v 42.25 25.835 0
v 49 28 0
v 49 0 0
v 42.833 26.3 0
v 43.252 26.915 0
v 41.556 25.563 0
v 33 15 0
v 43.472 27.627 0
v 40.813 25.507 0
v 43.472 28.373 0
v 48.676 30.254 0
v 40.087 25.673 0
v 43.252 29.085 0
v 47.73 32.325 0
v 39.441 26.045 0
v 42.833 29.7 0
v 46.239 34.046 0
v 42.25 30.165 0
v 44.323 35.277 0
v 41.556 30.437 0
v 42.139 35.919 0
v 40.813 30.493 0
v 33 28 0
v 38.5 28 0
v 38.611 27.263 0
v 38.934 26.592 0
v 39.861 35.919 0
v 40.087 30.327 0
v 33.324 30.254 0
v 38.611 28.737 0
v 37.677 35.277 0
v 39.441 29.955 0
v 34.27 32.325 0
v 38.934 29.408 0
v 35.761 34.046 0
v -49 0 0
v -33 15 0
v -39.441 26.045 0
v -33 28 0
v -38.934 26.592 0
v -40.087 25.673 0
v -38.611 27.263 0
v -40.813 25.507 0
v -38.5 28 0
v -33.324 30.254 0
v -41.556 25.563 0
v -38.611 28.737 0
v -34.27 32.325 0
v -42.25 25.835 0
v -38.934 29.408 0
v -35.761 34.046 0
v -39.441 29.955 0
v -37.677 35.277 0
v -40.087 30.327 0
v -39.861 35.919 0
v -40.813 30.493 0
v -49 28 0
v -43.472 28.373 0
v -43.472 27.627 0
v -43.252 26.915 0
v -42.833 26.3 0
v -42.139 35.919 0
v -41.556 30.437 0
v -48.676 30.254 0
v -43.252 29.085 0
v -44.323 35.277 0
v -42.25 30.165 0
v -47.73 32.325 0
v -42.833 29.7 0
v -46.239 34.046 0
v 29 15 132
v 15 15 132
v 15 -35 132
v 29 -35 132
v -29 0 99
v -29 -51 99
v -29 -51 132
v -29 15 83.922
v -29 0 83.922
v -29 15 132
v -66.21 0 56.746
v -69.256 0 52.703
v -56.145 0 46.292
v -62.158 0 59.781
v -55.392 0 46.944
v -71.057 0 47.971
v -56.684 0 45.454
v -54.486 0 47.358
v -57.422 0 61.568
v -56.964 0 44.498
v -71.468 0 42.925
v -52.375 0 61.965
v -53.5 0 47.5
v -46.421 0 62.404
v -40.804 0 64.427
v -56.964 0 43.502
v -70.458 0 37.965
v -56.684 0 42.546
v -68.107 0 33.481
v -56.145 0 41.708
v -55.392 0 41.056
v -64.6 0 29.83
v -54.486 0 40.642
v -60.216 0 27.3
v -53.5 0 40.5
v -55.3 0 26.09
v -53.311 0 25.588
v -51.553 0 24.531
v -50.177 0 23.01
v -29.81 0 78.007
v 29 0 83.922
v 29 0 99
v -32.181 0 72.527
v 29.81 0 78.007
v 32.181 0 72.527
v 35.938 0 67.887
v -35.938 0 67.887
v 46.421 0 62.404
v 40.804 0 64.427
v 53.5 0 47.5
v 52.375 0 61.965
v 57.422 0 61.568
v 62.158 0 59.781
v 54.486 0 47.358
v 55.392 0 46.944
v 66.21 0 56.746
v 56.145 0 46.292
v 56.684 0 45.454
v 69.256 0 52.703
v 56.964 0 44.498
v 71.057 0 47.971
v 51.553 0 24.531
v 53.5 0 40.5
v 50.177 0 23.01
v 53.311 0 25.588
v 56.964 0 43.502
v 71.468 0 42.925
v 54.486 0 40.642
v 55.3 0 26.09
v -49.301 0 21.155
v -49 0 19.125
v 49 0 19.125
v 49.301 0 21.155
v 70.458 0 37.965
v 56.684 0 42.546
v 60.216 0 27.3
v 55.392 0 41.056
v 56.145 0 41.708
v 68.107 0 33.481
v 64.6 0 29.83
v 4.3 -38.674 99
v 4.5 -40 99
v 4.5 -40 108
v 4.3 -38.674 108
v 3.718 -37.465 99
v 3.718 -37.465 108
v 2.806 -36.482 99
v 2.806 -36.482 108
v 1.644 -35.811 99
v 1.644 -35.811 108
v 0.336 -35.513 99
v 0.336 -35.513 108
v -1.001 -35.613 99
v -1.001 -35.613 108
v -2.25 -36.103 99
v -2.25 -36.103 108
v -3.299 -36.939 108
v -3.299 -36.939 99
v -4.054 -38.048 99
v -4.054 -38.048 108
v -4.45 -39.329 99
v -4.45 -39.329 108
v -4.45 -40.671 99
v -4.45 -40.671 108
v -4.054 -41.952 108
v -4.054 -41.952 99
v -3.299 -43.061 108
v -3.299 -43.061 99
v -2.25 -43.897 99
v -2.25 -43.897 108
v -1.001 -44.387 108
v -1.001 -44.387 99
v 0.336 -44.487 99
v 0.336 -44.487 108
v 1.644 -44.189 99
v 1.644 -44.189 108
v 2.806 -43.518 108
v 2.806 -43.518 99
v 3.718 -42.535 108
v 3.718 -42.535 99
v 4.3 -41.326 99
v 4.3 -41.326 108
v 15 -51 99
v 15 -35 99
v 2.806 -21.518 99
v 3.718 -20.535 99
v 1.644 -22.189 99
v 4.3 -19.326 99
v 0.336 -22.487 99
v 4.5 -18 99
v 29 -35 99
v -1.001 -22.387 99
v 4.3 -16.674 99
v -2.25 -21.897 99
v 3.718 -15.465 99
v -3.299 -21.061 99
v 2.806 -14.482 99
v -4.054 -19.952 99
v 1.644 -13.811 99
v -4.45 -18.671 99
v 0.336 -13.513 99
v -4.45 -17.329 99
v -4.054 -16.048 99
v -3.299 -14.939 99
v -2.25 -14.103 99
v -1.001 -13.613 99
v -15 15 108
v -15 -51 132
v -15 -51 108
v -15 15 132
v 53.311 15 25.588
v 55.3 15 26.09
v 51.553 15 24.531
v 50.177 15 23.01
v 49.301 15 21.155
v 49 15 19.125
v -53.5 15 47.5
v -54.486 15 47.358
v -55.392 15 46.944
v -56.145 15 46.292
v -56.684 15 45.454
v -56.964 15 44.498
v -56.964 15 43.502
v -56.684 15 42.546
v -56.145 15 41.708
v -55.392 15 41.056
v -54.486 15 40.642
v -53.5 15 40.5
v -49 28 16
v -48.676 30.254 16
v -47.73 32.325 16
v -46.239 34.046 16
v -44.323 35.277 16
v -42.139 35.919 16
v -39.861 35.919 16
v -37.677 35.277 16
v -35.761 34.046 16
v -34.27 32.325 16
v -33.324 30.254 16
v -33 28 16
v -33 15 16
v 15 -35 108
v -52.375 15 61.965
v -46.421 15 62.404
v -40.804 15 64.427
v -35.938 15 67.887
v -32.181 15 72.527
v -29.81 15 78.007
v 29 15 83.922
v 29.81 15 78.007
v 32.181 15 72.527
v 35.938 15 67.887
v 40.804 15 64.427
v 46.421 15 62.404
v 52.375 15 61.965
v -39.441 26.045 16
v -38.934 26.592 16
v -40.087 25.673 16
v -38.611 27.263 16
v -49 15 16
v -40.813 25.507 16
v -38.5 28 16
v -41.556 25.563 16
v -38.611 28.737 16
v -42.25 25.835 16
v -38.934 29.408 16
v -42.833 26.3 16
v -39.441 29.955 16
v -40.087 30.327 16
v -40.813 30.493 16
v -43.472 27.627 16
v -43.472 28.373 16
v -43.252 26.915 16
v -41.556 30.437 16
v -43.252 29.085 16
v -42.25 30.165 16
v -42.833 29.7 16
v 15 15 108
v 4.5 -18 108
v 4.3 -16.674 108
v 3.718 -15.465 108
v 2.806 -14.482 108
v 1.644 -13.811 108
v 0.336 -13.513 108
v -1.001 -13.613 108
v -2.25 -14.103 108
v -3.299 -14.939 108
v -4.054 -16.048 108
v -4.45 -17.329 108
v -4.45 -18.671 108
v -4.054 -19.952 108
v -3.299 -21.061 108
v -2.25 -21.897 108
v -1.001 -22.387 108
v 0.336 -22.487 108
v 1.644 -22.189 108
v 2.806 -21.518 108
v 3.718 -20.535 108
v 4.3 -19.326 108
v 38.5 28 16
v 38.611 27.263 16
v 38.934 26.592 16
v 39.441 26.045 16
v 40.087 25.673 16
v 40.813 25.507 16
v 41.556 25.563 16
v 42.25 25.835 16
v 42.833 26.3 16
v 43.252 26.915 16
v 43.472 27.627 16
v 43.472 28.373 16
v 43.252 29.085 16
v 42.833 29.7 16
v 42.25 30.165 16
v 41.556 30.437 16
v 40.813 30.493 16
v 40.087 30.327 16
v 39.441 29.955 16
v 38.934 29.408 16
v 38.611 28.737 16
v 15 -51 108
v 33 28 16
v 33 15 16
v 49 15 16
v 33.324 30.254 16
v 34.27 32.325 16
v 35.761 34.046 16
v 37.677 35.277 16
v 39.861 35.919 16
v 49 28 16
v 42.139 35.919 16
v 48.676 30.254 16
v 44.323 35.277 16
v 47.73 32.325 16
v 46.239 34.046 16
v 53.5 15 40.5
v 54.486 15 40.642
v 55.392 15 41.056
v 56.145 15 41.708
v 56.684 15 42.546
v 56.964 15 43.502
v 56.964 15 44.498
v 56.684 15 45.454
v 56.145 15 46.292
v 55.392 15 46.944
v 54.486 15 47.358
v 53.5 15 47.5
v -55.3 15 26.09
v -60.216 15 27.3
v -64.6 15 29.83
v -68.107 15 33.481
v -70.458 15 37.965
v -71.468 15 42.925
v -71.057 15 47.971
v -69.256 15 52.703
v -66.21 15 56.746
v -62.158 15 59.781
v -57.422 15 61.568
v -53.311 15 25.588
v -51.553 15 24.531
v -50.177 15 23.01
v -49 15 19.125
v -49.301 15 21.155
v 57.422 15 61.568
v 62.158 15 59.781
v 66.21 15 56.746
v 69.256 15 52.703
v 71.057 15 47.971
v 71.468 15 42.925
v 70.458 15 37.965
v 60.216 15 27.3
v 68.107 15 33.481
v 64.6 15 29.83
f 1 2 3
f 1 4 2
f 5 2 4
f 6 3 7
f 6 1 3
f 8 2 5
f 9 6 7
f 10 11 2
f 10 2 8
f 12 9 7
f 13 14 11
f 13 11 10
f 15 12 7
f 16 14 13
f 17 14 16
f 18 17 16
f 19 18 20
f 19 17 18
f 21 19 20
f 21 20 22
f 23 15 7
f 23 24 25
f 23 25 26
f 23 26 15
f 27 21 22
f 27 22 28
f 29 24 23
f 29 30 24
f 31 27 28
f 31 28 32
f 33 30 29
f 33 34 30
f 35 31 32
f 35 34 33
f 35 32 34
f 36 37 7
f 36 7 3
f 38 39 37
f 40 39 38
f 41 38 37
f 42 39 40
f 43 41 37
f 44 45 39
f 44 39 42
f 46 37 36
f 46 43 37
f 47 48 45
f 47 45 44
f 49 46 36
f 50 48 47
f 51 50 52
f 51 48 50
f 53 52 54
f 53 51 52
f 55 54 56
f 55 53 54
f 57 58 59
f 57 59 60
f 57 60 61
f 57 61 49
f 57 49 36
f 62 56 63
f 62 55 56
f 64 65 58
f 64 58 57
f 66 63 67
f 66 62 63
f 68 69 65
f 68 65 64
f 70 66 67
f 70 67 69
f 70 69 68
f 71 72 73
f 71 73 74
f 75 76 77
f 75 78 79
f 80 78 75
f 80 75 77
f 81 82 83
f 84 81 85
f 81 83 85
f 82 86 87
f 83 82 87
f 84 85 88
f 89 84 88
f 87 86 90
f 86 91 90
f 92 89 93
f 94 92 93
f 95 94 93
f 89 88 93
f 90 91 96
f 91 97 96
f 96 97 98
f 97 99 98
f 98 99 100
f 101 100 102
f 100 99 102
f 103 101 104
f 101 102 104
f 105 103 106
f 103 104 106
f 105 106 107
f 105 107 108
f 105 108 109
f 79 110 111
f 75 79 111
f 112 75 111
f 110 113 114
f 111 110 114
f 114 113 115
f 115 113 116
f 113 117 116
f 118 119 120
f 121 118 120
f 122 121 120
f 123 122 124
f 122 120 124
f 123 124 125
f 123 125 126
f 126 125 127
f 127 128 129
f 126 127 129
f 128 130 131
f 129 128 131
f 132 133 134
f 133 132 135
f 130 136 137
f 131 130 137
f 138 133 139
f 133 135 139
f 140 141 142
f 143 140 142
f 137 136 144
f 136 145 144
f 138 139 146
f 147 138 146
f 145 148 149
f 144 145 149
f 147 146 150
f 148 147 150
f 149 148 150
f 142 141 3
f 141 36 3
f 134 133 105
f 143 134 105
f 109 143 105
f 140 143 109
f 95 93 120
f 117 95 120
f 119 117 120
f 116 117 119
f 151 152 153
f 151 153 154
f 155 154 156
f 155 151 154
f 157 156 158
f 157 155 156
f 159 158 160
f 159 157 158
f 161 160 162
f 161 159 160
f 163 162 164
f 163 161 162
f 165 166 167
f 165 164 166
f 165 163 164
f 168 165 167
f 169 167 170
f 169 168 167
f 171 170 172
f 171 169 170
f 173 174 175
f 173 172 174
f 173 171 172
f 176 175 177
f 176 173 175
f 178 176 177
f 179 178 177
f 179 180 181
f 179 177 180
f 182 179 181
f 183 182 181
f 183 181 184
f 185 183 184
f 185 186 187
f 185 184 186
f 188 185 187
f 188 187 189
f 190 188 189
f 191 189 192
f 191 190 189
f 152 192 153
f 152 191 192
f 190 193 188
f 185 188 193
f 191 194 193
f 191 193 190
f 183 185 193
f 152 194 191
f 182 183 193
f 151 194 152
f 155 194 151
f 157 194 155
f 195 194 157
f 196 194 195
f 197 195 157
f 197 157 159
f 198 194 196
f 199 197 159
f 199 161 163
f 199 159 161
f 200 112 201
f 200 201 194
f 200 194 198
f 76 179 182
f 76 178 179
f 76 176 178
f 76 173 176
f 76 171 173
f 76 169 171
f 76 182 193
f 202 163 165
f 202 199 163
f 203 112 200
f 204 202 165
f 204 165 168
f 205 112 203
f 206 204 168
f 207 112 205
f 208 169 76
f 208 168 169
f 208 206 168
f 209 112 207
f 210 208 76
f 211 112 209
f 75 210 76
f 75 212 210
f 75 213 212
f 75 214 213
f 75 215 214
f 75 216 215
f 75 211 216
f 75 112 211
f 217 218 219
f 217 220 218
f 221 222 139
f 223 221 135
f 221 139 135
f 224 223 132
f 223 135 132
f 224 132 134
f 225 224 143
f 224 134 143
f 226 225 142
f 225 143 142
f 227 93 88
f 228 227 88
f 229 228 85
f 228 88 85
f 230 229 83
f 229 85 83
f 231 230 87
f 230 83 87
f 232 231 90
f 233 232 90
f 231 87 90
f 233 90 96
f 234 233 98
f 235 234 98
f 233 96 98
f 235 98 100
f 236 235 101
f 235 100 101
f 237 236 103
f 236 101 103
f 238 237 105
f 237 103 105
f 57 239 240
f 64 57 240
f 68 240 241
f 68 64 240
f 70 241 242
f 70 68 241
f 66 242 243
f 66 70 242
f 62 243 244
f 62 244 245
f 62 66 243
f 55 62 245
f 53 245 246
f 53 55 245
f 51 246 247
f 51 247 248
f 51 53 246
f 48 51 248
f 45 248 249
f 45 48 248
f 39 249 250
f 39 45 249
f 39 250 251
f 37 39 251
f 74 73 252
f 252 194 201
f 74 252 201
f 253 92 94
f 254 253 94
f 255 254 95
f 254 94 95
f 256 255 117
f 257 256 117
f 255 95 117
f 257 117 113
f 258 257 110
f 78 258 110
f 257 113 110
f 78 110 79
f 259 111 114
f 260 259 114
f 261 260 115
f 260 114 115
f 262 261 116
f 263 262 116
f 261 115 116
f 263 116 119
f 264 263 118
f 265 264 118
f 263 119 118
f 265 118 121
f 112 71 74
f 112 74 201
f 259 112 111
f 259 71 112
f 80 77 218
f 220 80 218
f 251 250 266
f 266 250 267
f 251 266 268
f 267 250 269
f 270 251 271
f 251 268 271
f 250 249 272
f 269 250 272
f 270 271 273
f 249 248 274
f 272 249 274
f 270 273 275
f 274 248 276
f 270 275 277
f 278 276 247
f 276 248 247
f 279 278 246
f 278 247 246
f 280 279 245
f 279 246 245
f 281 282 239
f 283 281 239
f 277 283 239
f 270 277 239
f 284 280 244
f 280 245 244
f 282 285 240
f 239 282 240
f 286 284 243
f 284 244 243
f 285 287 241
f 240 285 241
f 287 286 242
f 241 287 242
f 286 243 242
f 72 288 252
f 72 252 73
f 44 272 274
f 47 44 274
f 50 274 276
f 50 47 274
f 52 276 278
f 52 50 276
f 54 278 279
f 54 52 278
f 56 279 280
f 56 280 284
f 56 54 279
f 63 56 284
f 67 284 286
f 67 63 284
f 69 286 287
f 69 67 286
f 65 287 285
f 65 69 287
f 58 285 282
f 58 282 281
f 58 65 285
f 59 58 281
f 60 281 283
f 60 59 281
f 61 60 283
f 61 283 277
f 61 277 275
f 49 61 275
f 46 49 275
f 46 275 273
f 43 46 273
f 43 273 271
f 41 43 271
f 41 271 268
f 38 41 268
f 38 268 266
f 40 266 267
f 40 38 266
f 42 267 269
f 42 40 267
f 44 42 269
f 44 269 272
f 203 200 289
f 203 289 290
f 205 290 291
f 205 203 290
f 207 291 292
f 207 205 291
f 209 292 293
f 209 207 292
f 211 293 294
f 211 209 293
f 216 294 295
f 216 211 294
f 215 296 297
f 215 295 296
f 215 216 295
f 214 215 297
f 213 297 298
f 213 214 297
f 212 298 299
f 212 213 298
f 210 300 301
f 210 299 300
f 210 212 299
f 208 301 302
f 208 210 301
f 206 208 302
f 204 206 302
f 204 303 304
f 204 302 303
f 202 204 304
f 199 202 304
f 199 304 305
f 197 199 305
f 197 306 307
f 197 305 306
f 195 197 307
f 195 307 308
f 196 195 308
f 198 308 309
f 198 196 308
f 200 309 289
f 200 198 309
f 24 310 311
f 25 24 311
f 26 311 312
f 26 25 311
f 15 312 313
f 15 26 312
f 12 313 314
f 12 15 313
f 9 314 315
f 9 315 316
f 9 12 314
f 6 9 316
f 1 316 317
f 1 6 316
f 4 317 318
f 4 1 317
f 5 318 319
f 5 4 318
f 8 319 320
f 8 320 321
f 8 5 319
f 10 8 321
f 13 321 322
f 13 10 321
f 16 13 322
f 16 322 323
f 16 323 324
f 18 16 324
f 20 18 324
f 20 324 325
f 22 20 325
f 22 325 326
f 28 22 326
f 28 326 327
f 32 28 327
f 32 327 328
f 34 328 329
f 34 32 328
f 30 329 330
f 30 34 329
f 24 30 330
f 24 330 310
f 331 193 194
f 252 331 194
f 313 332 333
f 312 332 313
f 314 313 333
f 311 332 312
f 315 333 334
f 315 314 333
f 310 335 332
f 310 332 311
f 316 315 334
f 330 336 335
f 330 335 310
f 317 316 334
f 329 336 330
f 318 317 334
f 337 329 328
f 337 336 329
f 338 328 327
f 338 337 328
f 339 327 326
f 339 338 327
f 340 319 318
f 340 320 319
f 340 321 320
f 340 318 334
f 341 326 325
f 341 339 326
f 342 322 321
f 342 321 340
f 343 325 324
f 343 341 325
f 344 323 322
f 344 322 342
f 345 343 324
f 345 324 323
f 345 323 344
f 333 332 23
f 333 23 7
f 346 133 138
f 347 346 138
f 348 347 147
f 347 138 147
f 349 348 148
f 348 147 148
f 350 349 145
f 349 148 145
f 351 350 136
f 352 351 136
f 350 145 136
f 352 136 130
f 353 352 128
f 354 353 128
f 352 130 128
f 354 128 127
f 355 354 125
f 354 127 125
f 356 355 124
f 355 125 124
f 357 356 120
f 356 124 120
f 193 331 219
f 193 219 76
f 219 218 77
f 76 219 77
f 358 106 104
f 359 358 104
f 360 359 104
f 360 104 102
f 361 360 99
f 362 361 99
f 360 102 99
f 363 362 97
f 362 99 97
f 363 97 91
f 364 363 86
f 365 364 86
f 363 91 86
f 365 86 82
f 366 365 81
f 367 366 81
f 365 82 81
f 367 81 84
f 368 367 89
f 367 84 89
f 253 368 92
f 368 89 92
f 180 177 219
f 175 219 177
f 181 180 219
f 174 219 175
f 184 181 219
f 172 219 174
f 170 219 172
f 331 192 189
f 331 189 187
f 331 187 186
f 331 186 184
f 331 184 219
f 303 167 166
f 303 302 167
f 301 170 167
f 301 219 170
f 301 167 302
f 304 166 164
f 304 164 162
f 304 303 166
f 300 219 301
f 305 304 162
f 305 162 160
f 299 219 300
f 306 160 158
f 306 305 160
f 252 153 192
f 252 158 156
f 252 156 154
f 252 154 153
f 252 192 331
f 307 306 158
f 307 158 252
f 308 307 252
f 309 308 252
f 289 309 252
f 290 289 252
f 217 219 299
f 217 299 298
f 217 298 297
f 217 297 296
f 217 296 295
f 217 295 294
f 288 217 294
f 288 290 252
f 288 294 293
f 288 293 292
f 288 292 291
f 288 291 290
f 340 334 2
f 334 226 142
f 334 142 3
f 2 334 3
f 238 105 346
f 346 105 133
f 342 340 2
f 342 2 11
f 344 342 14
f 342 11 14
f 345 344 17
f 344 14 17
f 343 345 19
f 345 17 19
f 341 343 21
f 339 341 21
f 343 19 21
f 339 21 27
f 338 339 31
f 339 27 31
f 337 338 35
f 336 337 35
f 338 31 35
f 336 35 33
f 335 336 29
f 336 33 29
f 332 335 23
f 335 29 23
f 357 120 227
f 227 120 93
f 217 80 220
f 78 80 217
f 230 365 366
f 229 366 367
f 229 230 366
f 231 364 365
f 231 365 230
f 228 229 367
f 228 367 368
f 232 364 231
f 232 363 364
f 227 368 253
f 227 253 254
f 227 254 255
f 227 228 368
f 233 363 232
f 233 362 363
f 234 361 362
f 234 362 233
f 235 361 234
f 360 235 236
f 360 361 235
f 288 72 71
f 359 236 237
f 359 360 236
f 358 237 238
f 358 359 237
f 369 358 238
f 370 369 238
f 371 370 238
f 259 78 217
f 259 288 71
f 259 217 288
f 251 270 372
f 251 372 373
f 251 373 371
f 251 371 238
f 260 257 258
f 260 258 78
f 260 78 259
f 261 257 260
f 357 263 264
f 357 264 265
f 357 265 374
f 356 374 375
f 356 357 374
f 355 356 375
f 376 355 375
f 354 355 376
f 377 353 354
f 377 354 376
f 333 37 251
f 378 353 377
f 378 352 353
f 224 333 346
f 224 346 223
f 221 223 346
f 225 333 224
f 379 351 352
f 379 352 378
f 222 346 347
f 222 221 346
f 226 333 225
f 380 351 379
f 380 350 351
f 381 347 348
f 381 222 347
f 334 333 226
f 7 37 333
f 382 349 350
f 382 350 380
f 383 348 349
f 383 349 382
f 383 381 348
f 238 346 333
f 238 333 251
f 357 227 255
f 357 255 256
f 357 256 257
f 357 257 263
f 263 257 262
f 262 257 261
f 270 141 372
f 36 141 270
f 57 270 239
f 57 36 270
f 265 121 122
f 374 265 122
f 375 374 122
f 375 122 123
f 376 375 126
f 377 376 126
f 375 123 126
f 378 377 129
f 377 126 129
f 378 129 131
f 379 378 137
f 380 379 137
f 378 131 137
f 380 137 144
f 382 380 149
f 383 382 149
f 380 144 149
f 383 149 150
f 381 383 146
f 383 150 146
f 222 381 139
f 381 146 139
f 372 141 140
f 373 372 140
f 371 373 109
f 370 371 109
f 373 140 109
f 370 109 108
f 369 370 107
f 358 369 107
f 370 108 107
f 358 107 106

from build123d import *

# Parameters (mm, degrees)
BOSS_EXTRUDE1_DEPTH     = 15
SKETCH2_R               = 2.5
BOSS_EXTRUDE2_DEPTH     = 16
BOSS_EXTRUDE3_DEPTH     = 51
CUT_EXTRUDE1_DEPTH      = 140.202191075
CUT_EXTRUDE1_DEPTH_BACK = 140.202191075
SKETCH4_R               = 4.5
SKETCH4_W               = 14
SKETCH4_H               = 16


with BuildPart() as part:
    # Sketch1 → Boss-Extrude1 (new body)
    with BuildSketch(Plane(origin=(0, 0, 0), x_dir=(1, 0, 0), z_dir=(0, 1, 0))):
        with BuildLine():
            Line((49, 0), (-49, 0))
            Line((-49, 0), (-49, -19.125314072))
            ThreePointArc((-49, -19.125314072), (-50.808661059, -23.821056825), (-55.3, -26.090226132))
            ThreePointArc((-55.3, -26.090226132), (-71.440466452, -45.462758858), (-52.375, -61.964809351))
            ThreePointArc((-52.375, -61.964809351), (-35.937629669, -67.886680846), (-29, -83.921798557))
            Line((-29, -83.921798557), (-29, -132))
            Line((-29, -132), (-15, -132))
            Line((-15, -132), (-15, -108))
            Line((-15, -108), (15, -108))
            Line((15, -108), (15, -132))
            Line((15, -132), (29, -132))
            Line((29, -132), (29, -83.921798557))
            ThreePointArc((29, -83.921798557), (35.937629669, -67.886680846), (52.375, -61.964809351))
            ThreePointArc((52.375, -61.964809351), (71.440466452, -45.462758858), (55.3, -26.090226132))
            ThreePointArc((55.3, -26.090226132), (50.808661059, -23.821056825), (49, -19.125314072))
            Line((49, -19.125314072), (49, 0))
        make_face()
        with BuildLine():
            Line((-53.5, -40.5), (53.5, -40.5))
            ThreePointArc((53.5, -40.5), (57, -44), (53.5, -47.5))
            Line((53.5, -47.5), (-53.5, -47.5))
            ThreePointArc((-53.5, -47.5), (-57, -44), (-53.5, -40.5))
        make_face(mode=Mode.SUBTRACT)
    extrude(amount=BOSS_EXTRUDE1_DEPTH)

    # Sketch2 → Boss-Extrude2 (add)
    # profile 1 of 2: a face of its own
    with BuildSketch(Plane.XY):
        with BuildLine():
            Line((-49, 15), (-49, 28))
            ThreePointArc((-49, 28), (-41, 36), (-33, 28))
            Line((-33, 28), (-33, 15))
            Line((-33, 15), (-49, 15))
        make_face()
        with Locations((-41, 28)):
            Circle(SKETCH2_R, mode=Mode.SUBTRACT)
    # profile 2 of 2: a face of its own
    with BuildSketch(Plane.XY):
        with BuildLine():
            Line((33, 15), (49, 15))
            Line((49, 15), (49, 28))
            ThreePointArc((49, 28), (41, 36), (33, 28))
            Line((33, 28), (33, 15))
        make_face()
        with Locations(Location((41, 28, 0), (0, 0, 180))):
            Circle(SKETCH2_R, mode=Mode.SUBTRACT)
    extrude(amount=BOSS_EXTRUDE2_DEPTH)

    # Sketch3 → Boss-Extrude3 (add)
    with BuildSketch(Plane.XZ):
        Polygon((-15, 108), (15, 108), (15, 132), (29, 132), (29, 99), (-29, 99), (-29, 132), (-15, 132), align=None)
    extrude(amount=BOSS_EXTRUDE3_DEPTH)

    # Sketch4 → Cut-Extrude1 (cut, two sides: drawn at the far end of the back side and taken through both)
    with BuildSketch(Plane.XY.offset(108).offset(-CUT_EXTRUDE1_DEPTH_BACK)):
        with Locations((0, -18)):
            Circle(SKETCH4_R)
        with Locations((0, -40)):
            Circle(SKETCH4_R)
        with Locations((22, -43)):
            Rectangle(SKETCH4_W, SKETCH4_H)
    extrude(amount=CUT_EXTRUDE1_DEPTH + CUT_EXTRUDE1_DEPTH_BACK, mode=Mode.SUBTRACT)


solid = part.part
